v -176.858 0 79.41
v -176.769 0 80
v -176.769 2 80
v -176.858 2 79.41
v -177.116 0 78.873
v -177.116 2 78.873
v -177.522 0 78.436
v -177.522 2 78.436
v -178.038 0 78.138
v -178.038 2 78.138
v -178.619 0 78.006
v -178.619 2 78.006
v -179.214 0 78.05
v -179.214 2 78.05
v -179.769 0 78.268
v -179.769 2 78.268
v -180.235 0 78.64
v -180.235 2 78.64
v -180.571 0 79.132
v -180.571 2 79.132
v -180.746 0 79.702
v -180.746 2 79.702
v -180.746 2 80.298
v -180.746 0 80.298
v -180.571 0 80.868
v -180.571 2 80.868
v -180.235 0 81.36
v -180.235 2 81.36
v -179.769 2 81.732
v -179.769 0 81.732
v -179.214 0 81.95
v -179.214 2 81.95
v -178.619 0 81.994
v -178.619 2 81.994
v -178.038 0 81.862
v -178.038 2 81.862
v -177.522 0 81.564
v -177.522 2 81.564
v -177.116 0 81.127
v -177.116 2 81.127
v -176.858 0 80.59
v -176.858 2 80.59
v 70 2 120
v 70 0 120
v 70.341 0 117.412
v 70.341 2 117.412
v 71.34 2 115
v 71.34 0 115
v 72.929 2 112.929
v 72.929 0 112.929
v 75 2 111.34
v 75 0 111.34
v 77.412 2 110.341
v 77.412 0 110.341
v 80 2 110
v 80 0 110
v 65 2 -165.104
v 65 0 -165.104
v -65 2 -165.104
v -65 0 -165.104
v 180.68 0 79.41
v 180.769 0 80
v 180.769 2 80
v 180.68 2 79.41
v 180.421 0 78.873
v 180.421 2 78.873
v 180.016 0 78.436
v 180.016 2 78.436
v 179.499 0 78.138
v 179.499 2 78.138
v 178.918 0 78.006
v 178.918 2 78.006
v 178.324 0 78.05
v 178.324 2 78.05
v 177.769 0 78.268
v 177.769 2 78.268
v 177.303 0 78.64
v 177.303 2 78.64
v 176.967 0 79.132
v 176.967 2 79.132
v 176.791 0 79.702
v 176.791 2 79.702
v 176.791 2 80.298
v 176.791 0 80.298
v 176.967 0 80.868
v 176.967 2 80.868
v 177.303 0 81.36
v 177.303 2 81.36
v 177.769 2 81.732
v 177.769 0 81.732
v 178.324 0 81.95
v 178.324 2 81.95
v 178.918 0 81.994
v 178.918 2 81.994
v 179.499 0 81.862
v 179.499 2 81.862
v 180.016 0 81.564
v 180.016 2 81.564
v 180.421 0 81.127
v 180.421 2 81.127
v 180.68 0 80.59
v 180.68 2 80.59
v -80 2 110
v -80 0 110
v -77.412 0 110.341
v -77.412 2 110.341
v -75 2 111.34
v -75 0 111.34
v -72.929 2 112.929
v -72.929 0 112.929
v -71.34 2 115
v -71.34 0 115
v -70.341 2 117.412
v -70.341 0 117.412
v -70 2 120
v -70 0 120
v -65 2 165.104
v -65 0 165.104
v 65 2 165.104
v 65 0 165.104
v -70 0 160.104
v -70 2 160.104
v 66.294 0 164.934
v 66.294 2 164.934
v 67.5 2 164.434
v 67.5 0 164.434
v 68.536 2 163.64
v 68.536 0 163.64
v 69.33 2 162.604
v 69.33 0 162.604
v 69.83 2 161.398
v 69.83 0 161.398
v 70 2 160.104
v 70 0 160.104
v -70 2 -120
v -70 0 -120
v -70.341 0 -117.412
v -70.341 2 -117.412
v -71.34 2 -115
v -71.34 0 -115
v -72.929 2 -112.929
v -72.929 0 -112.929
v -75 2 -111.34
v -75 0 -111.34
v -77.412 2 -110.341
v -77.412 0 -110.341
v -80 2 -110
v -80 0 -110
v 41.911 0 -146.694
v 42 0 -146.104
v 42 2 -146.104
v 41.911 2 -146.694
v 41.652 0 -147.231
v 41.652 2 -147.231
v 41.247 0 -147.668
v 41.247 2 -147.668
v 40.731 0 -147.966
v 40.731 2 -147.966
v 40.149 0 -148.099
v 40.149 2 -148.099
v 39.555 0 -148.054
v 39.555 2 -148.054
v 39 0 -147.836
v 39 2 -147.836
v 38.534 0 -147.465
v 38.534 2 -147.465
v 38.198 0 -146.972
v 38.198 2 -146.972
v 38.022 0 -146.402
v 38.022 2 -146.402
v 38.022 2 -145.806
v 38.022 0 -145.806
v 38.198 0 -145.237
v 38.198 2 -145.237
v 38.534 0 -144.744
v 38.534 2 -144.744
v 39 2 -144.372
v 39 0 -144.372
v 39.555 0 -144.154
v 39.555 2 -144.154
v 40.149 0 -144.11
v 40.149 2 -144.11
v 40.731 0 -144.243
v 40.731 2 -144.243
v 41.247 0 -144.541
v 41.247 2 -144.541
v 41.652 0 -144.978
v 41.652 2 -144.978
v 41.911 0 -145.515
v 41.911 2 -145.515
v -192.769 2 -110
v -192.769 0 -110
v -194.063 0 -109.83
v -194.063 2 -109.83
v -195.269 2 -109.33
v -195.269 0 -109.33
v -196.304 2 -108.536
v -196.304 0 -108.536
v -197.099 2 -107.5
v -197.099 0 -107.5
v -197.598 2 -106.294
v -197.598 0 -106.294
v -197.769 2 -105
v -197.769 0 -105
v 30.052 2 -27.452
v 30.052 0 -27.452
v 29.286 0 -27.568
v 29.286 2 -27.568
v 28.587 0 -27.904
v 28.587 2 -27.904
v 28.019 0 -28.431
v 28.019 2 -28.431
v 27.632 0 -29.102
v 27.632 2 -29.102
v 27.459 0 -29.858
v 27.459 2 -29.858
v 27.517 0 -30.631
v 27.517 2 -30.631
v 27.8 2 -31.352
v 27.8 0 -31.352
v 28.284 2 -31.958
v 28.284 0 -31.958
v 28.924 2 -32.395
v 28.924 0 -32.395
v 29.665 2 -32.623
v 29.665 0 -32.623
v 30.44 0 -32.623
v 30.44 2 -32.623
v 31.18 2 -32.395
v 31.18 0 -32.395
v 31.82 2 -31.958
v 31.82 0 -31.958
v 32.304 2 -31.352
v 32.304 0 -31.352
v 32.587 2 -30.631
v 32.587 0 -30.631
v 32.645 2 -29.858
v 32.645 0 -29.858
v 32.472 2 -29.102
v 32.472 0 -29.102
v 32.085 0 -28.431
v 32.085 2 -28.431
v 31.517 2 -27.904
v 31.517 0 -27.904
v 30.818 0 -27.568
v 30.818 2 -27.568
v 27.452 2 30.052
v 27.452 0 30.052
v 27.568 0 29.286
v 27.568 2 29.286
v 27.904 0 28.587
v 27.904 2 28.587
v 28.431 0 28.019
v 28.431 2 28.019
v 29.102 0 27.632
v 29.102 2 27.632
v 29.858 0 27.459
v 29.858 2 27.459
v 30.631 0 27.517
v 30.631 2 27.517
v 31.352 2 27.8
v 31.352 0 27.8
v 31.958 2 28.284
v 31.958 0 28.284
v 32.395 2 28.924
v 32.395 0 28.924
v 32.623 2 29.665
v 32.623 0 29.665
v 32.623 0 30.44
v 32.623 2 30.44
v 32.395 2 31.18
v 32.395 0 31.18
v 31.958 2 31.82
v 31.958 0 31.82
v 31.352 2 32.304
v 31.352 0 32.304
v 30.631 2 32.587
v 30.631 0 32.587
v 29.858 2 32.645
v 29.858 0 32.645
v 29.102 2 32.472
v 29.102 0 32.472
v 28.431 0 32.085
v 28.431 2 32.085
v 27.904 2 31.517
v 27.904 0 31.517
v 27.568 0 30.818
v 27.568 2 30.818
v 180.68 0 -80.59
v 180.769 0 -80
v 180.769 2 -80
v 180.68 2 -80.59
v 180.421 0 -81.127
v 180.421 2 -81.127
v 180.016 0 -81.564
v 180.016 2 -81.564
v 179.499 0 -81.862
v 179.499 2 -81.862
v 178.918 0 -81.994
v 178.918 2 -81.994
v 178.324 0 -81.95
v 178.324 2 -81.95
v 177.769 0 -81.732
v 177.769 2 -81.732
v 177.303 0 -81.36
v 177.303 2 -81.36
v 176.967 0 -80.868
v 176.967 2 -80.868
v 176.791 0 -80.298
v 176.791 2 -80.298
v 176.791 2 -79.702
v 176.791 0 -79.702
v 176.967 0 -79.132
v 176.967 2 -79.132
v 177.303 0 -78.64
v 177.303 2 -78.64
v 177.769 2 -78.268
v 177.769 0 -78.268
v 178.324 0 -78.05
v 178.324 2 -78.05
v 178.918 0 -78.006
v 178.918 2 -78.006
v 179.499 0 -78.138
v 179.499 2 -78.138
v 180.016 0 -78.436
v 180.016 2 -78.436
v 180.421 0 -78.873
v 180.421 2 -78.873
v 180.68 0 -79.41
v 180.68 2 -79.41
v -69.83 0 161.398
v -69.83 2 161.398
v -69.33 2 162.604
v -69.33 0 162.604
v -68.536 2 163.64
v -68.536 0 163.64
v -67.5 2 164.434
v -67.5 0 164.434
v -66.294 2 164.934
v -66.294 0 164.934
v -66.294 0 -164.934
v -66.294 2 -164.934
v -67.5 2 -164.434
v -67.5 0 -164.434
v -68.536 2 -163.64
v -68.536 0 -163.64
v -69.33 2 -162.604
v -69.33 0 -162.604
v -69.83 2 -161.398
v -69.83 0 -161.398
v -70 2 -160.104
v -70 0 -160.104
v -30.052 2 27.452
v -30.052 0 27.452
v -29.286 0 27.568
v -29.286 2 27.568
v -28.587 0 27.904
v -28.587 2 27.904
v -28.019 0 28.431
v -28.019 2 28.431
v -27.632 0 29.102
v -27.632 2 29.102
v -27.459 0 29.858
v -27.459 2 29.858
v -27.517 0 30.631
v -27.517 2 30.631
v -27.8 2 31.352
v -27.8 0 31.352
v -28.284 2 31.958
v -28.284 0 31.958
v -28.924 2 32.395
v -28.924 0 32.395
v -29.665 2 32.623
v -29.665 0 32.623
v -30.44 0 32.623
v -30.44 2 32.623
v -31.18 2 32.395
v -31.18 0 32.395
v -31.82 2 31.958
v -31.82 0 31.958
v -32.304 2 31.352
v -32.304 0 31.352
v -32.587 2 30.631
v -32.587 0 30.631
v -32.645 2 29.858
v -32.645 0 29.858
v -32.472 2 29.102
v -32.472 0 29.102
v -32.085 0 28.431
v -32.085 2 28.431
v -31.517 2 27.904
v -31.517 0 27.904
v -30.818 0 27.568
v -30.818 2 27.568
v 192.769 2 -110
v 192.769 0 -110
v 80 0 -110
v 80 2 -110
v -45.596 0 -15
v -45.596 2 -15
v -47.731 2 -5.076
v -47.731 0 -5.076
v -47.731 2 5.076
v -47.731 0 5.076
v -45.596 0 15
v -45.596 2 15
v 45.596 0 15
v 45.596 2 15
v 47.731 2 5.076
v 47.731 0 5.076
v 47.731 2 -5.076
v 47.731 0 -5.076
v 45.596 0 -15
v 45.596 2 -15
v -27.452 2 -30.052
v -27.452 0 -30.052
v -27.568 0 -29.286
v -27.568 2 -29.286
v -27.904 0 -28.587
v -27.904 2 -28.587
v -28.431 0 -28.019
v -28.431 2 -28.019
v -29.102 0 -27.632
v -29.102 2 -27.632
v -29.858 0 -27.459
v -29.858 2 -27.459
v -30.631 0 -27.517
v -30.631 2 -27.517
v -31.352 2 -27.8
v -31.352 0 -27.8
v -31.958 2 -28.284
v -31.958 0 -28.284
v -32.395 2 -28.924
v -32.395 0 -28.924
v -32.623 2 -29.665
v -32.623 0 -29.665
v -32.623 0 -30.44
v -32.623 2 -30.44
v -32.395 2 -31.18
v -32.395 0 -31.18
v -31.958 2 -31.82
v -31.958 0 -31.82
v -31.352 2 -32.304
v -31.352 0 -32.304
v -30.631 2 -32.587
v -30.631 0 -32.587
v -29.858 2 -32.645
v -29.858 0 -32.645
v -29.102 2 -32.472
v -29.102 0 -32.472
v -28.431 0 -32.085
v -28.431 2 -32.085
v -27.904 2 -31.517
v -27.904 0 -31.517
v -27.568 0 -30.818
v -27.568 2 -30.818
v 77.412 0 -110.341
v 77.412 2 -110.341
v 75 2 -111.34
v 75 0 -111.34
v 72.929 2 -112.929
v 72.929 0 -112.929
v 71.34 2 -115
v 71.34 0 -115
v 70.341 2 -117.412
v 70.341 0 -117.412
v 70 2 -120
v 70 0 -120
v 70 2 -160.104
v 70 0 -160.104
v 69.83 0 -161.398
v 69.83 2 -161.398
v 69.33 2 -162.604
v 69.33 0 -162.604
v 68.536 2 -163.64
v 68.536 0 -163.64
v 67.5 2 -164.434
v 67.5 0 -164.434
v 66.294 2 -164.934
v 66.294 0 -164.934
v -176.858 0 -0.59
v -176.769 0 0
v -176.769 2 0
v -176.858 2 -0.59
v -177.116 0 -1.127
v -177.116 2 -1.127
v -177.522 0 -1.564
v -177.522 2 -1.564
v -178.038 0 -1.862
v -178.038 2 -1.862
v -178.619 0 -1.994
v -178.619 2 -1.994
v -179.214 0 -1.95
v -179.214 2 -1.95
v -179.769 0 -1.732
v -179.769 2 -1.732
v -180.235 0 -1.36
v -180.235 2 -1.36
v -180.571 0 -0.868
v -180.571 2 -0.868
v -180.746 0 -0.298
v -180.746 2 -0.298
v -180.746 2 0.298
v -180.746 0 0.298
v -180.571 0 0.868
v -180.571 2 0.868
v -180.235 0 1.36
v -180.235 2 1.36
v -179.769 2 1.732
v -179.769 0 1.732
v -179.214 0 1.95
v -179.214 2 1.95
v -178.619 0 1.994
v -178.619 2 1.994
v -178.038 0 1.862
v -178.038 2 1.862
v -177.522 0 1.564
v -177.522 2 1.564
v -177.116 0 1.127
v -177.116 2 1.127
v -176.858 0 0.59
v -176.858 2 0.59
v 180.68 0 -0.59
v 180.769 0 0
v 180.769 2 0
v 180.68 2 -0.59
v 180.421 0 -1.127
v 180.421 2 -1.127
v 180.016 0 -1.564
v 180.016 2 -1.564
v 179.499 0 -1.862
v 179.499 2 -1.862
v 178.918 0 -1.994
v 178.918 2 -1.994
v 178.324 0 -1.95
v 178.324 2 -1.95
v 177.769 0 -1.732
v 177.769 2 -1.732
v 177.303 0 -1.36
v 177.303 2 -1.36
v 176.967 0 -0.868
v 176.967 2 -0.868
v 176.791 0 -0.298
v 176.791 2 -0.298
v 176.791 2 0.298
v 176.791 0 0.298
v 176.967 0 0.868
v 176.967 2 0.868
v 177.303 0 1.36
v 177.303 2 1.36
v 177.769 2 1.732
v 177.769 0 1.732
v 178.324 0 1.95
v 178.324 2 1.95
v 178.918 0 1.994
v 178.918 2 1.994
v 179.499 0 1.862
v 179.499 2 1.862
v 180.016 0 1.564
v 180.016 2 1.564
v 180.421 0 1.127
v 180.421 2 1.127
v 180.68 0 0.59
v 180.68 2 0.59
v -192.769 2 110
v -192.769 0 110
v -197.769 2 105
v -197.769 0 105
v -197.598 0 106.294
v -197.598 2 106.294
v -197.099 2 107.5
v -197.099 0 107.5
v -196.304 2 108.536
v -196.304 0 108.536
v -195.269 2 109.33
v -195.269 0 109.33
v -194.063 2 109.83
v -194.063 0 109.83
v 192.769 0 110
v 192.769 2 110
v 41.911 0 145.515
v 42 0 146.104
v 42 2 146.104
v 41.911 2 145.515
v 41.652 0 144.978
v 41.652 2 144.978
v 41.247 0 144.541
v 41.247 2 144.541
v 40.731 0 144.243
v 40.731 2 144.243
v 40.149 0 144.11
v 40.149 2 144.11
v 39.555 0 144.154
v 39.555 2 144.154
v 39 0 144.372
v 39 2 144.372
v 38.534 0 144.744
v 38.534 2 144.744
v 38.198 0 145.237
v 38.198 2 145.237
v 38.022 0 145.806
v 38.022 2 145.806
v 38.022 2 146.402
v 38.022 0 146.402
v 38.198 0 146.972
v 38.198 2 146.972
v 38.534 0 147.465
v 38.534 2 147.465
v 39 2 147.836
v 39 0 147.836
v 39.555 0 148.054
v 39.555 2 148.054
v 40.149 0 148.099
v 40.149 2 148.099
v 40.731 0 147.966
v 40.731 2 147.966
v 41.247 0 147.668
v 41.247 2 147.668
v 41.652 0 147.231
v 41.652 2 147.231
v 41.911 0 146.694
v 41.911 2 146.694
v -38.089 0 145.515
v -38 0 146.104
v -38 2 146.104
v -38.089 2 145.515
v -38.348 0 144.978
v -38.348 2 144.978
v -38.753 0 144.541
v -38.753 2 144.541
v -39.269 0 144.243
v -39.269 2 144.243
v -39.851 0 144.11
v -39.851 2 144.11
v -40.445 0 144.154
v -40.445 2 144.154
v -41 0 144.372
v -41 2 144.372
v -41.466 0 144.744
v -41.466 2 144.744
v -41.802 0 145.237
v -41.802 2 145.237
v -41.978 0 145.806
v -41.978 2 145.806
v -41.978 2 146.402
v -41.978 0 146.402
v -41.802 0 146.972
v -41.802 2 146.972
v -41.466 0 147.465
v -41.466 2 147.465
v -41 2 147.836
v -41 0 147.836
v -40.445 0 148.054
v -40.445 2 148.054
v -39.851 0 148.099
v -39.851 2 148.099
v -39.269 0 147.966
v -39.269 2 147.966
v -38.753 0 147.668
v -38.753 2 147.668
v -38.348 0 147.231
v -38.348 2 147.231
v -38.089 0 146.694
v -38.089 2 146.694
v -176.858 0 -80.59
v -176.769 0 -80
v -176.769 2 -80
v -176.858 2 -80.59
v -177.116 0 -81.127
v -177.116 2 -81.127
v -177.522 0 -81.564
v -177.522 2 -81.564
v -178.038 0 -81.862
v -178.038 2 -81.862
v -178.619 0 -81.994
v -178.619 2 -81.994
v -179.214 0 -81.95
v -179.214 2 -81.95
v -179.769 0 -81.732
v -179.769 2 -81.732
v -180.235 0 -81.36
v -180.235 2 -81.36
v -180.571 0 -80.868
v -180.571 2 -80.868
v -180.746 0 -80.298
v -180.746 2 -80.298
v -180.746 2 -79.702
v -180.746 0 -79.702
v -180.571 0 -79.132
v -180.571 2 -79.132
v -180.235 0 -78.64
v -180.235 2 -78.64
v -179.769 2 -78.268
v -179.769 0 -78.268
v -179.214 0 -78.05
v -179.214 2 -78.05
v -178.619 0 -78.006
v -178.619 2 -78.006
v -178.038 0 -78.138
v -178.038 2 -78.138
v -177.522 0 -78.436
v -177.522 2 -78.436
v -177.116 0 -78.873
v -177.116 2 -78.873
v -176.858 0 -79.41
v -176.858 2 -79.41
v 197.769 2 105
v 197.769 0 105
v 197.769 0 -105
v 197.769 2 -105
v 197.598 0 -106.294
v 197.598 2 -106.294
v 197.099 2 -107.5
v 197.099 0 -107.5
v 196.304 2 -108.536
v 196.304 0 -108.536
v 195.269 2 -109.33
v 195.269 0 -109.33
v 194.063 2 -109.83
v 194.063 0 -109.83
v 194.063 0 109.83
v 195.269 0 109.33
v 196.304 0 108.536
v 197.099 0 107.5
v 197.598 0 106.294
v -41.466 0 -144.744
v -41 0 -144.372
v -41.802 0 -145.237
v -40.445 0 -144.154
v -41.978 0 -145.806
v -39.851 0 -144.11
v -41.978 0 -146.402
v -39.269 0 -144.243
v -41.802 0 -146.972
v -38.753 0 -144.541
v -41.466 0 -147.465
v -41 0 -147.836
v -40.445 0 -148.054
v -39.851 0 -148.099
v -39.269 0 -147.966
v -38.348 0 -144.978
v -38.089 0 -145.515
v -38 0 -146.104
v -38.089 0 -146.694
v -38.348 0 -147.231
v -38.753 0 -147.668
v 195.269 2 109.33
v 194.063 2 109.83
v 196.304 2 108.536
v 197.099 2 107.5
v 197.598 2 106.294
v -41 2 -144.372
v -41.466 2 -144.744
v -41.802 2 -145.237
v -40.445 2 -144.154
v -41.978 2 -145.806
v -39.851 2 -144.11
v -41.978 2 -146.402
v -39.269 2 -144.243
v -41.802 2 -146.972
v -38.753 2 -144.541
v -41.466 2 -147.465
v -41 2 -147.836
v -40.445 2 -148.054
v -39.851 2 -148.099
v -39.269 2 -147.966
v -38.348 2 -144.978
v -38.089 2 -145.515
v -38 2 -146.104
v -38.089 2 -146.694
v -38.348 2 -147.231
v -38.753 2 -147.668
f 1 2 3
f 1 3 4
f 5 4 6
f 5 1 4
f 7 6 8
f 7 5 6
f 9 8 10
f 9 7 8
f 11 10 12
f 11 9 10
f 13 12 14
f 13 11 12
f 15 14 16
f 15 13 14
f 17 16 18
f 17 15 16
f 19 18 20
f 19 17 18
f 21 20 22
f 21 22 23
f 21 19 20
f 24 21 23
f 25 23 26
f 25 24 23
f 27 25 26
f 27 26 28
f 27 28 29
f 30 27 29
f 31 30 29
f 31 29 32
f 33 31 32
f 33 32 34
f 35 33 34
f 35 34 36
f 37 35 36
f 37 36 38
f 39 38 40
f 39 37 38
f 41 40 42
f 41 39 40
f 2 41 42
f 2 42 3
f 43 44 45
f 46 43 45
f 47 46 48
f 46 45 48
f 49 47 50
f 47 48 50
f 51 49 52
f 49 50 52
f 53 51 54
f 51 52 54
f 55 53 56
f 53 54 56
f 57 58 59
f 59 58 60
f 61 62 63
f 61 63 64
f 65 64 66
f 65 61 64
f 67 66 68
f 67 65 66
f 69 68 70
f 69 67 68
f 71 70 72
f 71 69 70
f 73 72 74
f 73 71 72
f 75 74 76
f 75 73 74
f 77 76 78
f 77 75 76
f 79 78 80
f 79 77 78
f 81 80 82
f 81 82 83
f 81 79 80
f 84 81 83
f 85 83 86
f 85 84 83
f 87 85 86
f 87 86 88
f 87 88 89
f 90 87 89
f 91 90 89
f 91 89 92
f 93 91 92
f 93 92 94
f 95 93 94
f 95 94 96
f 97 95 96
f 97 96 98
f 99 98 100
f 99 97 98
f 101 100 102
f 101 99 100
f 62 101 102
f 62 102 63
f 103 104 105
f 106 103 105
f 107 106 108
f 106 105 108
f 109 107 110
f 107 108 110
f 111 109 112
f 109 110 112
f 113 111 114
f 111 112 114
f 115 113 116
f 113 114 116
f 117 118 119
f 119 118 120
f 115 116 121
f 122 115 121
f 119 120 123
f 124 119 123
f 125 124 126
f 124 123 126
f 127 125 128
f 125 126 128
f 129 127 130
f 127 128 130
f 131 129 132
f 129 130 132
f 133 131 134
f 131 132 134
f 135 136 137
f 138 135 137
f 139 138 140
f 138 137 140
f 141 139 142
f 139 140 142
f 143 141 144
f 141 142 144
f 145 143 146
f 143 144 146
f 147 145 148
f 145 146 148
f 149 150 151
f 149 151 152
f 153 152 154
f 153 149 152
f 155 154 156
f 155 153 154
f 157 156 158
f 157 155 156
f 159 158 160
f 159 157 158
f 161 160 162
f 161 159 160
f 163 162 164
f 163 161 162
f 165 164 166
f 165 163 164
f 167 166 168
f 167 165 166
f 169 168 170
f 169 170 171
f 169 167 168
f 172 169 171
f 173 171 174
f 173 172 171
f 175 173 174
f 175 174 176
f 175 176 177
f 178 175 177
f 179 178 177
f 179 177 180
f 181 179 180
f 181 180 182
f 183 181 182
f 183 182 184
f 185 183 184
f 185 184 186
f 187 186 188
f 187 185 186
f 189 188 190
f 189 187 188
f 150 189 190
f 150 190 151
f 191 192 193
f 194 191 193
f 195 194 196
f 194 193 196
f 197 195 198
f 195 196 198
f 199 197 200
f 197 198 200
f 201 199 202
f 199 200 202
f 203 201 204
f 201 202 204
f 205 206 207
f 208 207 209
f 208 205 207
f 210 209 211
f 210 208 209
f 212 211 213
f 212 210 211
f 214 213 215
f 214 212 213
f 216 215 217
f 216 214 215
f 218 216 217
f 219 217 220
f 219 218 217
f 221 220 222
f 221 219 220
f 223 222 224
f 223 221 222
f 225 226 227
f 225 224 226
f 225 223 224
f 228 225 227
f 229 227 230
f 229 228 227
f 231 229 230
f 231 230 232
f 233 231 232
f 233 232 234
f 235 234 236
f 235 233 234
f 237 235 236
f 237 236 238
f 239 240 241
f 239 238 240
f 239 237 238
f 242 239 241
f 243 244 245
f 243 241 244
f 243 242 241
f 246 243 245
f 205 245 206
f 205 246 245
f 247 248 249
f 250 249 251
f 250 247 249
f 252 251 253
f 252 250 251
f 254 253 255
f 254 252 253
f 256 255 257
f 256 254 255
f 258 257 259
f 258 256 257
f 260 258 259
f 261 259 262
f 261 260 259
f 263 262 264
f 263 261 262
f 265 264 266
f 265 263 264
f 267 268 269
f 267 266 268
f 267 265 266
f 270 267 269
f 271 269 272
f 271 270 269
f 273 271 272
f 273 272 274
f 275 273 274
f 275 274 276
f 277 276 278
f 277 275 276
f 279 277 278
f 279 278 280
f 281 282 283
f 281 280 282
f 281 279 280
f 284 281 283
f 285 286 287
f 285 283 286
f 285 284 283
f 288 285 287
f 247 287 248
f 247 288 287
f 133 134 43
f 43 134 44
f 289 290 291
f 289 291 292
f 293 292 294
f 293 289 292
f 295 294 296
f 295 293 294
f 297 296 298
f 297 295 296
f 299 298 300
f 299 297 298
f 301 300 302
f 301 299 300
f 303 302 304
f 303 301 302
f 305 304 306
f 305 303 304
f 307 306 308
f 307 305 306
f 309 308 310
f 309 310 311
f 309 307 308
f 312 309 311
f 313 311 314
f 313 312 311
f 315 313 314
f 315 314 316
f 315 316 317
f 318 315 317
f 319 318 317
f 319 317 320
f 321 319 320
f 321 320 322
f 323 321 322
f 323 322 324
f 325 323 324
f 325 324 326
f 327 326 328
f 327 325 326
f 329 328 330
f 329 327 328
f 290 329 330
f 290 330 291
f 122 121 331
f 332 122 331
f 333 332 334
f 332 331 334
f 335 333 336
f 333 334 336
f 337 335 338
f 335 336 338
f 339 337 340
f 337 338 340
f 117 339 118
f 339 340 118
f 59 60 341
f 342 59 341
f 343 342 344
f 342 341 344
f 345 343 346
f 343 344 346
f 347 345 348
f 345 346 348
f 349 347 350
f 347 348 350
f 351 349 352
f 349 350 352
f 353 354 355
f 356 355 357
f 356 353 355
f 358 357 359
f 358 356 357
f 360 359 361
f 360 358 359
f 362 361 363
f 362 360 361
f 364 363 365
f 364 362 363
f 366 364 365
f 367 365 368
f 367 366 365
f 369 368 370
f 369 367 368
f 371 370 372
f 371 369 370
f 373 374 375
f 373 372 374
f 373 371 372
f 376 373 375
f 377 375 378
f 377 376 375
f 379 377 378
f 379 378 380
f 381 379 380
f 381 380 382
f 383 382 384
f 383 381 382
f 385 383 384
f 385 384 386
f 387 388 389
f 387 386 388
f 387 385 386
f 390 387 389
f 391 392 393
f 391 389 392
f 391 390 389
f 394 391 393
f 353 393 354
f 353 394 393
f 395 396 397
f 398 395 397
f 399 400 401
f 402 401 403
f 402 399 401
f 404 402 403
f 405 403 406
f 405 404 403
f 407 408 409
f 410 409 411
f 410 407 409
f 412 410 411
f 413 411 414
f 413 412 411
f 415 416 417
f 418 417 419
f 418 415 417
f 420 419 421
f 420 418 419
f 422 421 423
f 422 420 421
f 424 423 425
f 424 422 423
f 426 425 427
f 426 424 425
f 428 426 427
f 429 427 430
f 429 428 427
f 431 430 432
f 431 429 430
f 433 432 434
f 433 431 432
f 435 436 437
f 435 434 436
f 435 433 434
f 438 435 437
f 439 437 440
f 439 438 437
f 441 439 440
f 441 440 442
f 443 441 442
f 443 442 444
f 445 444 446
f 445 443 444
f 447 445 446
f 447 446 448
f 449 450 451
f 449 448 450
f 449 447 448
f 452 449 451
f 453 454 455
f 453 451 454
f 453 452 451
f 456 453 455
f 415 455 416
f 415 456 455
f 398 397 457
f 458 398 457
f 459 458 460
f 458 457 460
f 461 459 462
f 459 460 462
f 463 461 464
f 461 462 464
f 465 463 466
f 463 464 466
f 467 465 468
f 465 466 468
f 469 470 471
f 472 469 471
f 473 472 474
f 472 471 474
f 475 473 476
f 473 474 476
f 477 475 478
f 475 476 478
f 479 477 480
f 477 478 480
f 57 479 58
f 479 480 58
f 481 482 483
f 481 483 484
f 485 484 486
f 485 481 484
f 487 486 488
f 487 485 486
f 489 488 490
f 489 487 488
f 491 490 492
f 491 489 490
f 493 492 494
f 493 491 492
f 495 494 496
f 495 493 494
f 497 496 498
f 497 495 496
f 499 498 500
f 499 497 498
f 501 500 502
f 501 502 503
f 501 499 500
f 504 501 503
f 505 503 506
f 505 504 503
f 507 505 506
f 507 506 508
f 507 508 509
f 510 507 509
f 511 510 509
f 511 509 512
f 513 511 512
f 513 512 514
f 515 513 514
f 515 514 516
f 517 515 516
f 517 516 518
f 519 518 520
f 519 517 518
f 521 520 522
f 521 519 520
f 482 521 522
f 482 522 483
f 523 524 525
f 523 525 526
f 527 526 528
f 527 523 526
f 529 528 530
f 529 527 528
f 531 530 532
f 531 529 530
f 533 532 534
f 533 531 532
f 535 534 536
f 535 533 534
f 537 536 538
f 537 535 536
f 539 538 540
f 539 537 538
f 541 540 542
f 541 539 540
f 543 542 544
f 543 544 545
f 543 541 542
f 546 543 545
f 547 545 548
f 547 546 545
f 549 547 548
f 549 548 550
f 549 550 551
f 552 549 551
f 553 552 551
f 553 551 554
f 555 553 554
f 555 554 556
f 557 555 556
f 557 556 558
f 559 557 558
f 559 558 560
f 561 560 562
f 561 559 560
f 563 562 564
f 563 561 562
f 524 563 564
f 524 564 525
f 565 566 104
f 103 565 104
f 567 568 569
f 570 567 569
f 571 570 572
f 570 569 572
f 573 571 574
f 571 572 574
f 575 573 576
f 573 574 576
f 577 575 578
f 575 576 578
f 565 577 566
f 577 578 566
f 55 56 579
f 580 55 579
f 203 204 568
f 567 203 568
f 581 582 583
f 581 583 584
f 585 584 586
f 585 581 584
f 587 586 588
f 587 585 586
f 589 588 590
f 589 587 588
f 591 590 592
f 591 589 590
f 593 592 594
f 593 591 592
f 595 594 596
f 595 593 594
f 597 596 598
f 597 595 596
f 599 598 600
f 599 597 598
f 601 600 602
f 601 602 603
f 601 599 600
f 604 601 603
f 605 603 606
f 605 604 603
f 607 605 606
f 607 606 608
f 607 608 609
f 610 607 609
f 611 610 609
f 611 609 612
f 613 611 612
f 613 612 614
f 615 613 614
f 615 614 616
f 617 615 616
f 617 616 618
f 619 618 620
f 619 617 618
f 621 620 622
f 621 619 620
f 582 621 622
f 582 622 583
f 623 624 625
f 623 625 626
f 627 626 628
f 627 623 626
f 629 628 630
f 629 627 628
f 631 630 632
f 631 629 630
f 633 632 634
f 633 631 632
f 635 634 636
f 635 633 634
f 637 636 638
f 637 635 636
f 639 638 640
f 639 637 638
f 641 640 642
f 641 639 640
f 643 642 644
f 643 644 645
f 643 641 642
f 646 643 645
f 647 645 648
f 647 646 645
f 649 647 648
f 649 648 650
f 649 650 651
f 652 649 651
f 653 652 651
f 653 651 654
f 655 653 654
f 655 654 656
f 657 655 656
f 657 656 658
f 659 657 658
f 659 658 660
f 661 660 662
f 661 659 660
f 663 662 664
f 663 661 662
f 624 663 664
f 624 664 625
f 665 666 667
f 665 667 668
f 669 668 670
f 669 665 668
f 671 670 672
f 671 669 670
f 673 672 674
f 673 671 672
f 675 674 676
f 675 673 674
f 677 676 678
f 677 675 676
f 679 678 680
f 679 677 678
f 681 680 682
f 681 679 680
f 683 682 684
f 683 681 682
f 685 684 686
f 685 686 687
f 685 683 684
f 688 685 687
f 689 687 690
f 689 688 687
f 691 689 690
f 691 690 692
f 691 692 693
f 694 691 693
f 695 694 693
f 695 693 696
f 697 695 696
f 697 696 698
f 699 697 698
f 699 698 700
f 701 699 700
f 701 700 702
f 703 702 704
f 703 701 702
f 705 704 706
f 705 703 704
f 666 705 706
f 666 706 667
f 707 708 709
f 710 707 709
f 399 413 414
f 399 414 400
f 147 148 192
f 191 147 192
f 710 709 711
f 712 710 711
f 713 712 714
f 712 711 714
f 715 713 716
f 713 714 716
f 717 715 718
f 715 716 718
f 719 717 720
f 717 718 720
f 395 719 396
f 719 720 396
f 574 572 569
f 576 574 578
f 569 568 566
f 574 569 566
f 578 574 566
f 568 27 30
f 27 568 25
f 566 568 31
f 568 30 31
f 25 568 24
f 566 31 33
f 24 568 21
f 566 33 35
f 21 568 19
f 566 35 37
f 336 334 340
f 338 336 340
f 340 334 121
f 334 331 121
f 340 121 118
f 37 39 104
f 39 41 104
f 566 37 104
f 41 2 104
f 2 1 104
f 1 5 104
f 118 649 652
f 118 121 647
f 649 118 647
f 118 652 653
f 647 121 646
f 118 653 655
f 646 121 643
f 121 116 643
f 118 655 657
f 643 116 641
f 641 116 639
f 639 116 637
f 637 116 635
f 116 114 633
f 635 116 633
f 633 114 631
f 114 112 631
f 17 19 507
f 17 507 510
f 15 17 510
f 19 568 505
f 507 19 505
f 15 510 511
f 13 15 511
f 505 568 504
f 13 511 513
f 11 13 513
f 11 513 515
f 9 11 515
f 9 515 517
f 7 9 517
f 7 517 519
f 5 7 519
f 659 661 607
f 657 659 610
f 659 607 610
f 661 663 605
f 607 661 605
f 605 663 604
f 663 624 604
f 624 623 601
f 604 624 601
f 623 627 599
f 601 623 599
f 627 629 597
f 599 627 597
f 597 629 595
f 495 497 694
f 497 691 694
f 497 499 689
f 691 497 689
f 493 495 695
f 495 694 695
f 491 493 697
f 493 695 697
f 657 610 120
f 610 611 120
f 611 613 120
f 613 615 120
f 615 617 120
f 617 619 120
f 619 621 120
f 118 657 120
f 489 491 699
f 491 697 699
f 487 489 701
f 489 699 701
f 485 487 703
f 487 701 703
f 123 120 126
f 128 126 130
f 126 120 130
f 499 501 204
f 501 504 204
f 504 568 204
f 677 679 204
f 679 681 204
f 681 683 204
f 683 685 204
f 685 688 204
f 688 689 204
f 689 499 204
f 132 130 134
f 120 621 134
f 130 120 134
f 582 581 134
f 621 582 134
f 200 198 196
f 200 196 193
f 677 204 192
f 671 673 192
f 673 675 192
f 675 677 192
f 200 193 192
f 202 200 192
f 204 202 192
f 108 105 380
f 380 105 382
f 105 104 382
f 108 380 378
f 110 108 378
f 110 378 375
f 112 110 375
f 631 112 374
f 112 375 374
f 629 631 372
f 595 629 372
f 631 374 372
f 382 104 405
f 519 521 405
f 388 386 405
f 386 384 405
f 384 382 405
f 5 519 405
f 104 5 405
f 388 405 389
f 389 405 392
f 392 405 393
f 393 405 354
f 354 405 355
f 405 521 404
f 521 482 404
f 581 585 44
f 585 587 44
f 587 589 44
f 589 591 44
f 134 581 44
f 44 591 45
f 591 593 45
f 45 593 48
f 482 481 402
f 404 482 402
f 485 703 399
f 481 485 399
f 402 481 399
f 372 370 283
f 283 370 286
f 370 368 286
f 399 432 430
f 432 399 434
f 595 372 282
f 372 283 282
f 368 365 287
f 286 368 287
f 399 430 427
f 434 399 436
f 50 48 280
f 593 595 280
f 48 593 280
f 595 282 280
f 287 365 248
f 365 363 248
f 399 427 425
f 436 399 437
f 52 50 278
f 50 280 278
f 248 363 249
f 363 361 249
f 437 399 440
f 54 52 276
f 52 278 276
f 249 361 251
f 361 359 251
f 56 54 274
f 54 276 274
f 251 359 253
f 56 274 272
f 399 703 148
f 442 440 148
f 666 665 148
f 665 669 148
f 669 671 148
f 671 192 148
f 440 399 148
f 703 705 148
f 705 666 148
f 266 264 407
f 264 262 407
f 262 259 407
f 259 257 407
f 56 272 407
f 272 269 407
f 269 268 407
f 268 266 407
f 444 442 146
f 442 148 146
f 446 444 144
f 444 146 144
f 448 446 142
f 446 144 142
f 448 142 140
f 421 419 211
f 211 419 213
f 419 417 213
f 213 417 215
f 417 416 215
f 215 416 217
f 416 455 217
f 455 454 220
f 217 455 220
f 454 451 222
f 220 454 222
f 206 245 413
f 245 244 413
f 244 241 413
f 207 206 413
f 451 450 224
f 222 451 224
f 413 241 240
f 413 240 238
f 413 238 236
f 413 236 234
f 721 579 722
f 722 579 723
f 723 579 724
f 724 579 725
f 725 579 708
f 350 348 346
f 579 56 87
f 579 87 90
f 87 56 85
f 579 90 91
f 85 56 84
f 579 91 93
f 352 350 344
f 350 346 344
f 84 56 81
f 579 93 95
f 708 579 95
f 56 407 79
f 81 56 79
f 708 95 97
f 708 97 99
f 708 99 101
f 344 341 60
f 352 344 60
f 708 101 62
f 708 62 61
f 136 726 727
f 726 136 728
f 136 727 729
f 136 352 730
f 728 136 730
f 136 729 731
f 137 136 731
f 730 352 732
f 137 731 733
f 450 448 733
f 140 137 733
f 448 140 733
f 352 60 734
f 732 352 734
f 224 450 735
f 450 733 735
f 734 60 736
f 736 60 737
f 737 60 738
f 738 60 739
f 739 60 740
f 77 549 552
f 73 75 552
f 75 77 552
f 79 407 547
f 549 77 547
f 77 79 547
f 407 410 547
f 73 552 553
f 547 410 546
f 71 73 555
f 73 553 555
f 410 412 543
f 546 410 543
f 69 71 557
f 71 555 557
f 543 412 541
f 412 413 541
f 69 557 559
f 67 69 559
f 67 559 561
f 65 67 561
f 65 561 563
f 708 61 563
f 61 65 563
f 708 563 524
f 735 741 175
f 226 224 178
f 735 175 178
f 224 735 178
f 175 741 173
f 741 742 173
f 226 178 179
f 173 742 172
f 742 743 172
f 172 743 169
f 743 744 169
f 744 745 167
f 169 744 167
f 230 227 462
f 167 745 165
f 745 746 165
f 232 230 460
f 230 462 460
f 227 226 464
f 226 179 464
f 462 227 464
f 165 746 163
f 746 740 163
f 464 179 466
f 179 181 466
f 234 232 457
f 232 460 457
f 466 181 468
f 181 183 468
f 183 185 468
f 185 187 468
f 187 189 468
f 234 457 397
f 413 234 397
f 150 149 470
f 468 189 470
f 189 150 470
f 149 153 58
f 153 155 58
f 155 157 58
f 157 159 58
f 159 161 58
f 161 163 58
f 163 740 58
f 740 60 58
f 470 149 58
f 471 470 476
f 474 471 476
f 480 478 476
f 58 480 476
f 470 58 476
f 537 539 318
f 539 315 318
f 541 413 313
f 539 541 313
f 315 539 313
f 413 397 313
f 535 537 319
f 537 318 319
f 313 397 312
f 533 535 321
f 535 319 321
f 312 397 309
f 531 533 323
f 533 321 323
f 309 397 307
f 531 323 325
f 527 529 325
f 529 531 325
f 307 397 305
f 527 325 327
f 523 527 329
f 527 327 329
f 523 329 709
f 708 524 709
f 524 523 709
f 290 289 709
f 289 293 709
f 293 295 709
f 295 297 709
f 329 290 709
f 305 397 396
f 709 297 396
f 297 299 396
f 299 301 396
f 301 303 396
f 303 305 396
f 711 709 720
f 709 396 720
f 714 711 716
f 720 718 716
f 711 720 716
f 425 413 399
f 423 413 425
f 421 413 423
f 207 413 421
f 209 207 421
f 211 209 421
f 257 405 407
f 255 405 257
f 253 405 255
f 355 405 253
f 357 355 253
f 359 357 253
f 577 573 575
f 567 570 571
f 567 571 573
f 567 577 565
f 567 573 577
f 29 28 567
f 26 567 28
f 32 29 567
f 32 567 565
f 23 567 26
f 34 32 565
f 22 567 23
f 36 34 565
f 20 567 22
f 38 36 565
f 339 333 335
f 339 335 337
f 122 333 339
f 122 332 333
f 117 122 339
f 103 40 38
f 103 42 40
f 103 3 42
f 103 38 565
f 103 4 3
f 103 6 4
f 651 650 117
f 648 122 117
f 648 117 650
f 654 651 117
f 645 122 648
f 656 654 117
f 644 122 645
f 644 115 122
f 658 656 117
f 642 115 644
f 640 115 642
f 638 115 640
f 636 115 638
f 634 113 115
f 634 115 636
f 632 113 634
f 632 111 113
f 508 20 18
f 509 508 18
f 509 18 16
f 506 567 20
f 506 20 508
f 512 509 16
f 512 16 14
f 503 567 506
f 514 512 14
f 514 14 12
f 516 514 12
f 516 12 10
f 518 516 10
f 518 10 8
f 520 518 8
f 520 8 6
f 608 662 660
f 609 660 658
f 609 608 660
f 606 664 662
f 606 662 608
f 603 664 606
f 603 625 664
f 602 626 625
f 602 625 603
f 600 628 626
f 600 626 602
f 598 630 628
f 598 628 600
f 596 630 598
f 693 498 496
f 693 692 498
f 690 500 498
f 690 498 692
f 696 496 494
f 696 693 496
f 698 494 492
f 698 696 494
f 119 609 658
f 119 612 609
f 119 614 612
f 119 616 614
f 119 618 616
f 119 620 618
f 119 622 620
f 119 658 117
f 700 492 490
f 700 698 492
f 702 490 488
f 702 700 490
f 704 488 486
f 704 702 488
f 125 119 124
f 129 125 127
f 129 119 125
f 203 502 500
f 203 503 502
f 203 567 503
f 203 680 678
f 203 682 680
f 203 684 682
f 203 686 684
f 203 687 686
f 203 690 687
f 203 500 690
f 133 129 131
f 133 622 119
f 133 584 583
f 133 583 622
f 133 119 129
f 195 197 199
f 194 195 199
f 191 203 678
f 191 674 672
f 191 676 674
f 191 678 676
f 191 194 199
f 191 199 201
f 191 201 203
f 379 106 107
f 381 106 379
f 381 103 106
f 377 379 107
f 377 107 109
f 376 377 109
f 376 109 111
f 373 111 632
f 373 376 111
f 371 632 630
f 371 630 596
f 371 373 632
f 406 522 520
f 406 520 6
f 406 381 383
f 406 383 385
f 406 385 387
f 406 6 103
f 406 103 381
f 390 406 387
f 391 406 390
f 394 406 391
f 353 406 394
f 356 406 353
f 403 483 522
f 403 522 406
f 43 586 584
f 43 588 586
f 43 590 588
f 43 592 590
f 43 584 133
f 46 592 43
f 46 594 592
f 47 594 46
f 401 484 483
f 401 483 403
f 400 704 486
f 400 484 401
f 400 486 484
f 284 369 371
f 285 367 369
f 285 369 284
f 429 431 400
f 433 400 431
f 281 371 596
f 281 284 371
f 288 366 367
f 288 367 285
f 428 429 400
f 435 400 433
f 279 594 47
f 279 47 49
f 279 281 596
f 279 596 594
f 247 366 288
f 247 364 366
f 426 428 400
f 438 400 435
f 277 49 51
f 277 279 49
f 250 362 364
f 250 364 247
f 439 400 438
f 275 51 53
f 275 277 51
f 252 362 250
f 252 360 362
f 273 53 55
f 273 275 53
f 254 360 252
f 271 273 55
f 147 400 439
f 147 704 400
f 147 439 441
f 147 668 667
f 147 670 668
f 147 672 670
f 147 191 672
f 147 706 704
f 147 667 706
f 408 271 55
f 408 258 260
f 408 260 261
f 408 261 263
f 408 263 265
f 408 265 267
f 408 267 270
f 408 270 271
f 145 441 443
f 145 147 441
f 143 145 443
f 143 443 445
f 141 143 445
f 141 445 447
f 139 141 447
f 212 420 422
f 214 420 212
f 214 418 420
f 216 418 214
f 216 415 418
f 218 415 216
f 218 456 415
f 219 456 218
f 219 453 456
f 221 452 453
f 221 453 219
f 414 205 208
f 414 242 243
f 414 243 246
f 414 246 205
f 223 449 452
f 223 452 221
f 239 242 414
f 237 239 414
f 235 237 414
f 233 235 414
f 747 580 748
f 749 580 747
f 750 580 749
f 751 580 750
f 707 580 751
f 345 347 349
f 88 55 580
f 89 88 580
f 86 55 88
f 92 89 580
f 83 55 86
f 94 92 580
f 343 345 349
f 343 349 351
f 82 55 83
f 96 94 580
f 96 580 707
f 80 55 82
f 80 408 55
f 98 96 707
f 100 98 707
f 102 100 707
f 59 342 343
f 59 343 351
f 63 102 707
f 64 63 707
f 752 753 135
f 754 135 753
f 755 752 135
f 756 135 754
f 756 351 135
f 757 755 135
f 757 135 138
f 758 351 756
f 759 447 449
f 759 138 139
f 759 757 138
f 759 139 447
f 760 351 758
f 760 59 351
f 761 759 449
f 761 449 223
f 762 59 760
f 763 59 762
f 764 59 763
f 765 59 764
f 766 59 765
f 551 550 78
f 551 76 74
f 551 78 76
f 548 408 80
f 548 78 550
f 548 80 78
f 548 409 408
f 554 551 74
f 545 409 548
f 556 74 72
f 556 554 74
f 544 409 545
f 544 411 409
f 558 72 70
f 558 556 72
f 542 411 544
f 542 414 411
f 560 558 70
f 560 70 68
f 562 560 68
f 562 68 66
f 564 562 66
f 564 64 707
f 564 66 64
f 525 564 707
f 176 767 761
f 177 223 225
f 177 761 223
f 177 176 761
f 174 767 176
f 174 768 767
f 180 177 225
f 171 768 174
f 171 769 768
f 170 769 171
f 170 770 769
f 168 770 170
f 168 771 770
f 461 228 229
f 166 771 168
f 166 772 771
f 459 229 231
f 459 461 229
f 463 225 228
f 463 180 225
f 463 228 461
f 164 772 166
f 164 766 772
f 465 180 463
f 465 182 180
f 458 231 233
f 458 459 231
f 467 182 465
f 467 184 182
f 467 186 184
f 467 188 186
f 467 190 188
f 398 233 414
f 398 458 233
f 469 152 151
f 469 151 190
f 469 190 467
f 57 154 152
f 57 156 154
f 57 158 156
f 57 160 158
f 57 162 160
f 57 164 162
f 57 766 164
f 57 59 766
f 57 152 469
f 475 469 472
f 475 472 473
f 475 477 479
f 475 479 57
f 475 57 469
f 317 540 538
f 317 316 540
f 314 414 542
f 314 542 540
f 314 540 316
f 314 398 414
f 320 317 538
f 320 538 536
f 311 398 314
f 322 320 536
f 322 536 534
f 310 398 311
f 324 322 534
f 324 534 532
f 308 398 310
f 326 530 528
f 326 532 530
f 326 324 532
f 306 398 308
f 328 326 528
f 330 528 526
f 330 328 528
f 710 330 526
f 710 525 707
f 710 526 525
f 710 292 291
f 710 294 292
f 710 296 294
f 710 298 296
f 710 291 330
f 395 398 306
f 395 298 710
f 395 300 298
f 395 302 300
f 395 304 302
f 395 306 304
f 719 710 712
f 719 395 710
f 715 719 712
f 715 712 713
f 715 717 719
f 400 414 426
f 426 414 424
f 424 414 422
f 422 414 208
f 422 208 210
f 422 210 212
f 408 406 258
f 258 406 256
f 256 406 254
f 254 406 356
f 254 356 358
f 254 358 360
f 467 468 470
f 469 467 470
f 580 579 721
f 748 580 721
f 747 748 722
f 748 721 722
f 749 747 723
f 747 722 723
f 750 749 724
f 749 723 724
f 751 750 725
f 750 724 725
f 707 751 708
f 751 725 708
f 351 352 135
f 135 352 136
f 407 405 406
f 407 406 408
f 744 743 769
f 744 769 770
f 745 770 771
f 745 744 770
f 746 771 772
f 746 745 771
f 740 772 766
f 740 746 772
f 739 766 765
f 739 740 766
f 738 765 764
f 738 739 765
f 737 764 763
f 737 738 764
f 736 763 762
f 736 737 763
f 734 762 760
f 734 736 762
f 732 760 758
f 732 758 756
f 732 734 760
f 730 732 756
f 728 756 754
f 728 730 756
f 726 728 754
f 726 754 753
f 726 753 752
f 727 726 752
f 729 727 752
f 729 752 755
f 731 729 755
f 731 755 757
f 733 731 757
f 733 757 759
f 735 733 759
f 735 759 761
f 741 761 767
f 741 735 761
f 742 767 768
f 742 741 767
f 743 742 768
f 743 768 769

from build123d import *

# Parameters (mm, degrees)
SKETCH_1_R               = 2
EXTRUDE_1_DEPTH          = 2
CUT_EXTRUDE_2_DEPTH      = 3
PATTERN_CIRCULAR_1_COUNT = 4


with BuildPart() as part:
    # Эскиз1 → Бобышка-Вытянуть1 (new body)
    with BuildSketch(Plane(origin=(0, 0, 0), x_dir=(1, 0, 0), z_dir=(0, 1, 0))):
        with BuildLine():
            Line((-65, -165.104291208), (65, -165.104291208))
            ThreePointArc((65, -165.104291208), (68.535533906, -163.639825114), (70, -160.104291208))
            Line((70, -160.104291208), (70, -120))
            ThreePointArc((70, -120), (72.928932188, -112.928932188), (80, -110))
            Line((80, -110), (192.768667216, -110))
            ThreePointArc((192.768667216, -110), (196.304201122, -108.535533906), (197.768667216, -105))
            Line((197.768667216, -105), (197.768667216, 105))
            ThreePointArc((197.768667216, 105), (196.304201122, 108.535533906), (192.768667216, 110))
            Line((192.768667216, 110), (80, 110))
            ThreePointArc((80, 110), (72.928932188, 112.928932188), (70, 120))
            Line((70, 120), (70, 160.104291208))
            ThreePointArc((70, 160.104291208), (68.535533906, 163.639825114), (65, 165.104291208))
            Line((65, 165.104291208), (-65, 165.104291208))
            ThreePointArc((-65, 165.104291208), (-68.535533906, 163.639825114), (-70, 160.104291208))
            Line((-70, 160.104291208), (-70, 120))
            ThreePointArc((-70, 120), (-72.928932188, 112.928932188), (-80, 110))
            Line((-80, 110), (-192.768667216, 110))
            ThreePointArc((-192.768667216, 110), (-196.304201122, 108.535533906), (-197.768667216, 105))
            Line((-197.768667216, 105), (-197.768667216, -105))
            ThreePointArc((-197.768667216, -105), (-196.304201122, -108.535533906), (-192.768667216, -110))
            Line((-192.768667216, -110), (-80, -110))
            ThreePointArc((-80, -110), (-72.928932188, -112.928932188), (-70, -120))
            Line((-70, -120), (-70, -160.104291208))
            ThreePointArc((-70, -160.104291208), (-68.535533906, -163.639825114), (-65, -165.104291208))
        make_face()
        with Locations((178.768667216, 0)):
            Circle(SKETCH_1_R, mode=Mode.SUBTRACT)
        with Locations((178.768667216, 80)):
            Circle(SKETCH_1_R, mode=Mode.SUBTRACT)
        with Locations((178.768667216, -80)):
            Circle(SKETCH_1_R, mode=Mode.SUBTRACT)
        with Locations((-178.768667216, -80)):
            Circle(SKETCH_1_R, mode=Mode.SUBTRACT)
        with Locations((-178.768667216, 0)):
            Circle(SKETCH_1_R, mode=Mode.SUBTRACT)
        with Locations((-178.768667216, 80)):
            Circle(SKETCH_1_R, mode=Mode.SUBTRACT)
        with Locations((40, 146.104291208)):
            Circle(SKETCH_1_R, mode=Mode.SUBTRACT)
        with Locations((-40, 146.104291208)):
            Circle(SKETCH_1_R, mode=Mode.SUBTRACT)
        with Locations((-40, -146.104291208)):
            Circle(SKETCH_1_R, mode=Mode.SUBTRACT)
        with Locations((40, -146.104291208)):
            Circle(SKETCH_1_R, mode=Mode.SUBTRACT)
    extrude(amount=EXTRUDE_1_DEPTH)

    # Эскиз5 → Вырез-Вытянуть2 (cut, through all)
    with BuildSketch(Plane.XZ):
        with BuildLine():
            Line((45.596052461, -15), (-45.596052461, -15))
            ThreePointArc((-45.596052461, -15), (-48, 0), (-45.596052461, 15))
            Line((-45.596052461, 15), (45.596052461, 15))
            ThreePointArc((45.596052461, 15), (48, 0), (45.596052461, -15))
        make_face()
    extrude(amount=-CUT_EXTRUDE_2_DEPTH, mode=Mode.SUBTRACT)

    # Эскиз7 → Сверло под метчик  спиральное M51 (revolve, cut)
    with BuildSketch(Plane(origin=(30.0520382, 2, -30.0520382), x_dir=(0, 0, 1), z_dir=(1, 0, 0))):
        Polygon((0, 0), (0, 9.562237609), (2.6, 8), (2.6, 0), align=None)
    hole_wizard_m51 = revolve(axis=Axis((30.0520382, 8.35, -30.0520382), (0, -1, 0)), mode=Mode.SUBTRACT)

    # Круговой массив1: Сверло под метчик  спиральное M51 ×4 about axis
    pattern_circular_1_axis = Axis((0, 0, 0), (0, 1, 0))
    for i in range(1, PATTERN_CIRCULAR_1_COUNT):
        add(hole_wizard_m51.rotate(pattern_circular_1_axis, i * 360 / PATTERN_CIRCULAR_1_COUNT), mode=Mode.SUBTRACT)


solid = part.part
